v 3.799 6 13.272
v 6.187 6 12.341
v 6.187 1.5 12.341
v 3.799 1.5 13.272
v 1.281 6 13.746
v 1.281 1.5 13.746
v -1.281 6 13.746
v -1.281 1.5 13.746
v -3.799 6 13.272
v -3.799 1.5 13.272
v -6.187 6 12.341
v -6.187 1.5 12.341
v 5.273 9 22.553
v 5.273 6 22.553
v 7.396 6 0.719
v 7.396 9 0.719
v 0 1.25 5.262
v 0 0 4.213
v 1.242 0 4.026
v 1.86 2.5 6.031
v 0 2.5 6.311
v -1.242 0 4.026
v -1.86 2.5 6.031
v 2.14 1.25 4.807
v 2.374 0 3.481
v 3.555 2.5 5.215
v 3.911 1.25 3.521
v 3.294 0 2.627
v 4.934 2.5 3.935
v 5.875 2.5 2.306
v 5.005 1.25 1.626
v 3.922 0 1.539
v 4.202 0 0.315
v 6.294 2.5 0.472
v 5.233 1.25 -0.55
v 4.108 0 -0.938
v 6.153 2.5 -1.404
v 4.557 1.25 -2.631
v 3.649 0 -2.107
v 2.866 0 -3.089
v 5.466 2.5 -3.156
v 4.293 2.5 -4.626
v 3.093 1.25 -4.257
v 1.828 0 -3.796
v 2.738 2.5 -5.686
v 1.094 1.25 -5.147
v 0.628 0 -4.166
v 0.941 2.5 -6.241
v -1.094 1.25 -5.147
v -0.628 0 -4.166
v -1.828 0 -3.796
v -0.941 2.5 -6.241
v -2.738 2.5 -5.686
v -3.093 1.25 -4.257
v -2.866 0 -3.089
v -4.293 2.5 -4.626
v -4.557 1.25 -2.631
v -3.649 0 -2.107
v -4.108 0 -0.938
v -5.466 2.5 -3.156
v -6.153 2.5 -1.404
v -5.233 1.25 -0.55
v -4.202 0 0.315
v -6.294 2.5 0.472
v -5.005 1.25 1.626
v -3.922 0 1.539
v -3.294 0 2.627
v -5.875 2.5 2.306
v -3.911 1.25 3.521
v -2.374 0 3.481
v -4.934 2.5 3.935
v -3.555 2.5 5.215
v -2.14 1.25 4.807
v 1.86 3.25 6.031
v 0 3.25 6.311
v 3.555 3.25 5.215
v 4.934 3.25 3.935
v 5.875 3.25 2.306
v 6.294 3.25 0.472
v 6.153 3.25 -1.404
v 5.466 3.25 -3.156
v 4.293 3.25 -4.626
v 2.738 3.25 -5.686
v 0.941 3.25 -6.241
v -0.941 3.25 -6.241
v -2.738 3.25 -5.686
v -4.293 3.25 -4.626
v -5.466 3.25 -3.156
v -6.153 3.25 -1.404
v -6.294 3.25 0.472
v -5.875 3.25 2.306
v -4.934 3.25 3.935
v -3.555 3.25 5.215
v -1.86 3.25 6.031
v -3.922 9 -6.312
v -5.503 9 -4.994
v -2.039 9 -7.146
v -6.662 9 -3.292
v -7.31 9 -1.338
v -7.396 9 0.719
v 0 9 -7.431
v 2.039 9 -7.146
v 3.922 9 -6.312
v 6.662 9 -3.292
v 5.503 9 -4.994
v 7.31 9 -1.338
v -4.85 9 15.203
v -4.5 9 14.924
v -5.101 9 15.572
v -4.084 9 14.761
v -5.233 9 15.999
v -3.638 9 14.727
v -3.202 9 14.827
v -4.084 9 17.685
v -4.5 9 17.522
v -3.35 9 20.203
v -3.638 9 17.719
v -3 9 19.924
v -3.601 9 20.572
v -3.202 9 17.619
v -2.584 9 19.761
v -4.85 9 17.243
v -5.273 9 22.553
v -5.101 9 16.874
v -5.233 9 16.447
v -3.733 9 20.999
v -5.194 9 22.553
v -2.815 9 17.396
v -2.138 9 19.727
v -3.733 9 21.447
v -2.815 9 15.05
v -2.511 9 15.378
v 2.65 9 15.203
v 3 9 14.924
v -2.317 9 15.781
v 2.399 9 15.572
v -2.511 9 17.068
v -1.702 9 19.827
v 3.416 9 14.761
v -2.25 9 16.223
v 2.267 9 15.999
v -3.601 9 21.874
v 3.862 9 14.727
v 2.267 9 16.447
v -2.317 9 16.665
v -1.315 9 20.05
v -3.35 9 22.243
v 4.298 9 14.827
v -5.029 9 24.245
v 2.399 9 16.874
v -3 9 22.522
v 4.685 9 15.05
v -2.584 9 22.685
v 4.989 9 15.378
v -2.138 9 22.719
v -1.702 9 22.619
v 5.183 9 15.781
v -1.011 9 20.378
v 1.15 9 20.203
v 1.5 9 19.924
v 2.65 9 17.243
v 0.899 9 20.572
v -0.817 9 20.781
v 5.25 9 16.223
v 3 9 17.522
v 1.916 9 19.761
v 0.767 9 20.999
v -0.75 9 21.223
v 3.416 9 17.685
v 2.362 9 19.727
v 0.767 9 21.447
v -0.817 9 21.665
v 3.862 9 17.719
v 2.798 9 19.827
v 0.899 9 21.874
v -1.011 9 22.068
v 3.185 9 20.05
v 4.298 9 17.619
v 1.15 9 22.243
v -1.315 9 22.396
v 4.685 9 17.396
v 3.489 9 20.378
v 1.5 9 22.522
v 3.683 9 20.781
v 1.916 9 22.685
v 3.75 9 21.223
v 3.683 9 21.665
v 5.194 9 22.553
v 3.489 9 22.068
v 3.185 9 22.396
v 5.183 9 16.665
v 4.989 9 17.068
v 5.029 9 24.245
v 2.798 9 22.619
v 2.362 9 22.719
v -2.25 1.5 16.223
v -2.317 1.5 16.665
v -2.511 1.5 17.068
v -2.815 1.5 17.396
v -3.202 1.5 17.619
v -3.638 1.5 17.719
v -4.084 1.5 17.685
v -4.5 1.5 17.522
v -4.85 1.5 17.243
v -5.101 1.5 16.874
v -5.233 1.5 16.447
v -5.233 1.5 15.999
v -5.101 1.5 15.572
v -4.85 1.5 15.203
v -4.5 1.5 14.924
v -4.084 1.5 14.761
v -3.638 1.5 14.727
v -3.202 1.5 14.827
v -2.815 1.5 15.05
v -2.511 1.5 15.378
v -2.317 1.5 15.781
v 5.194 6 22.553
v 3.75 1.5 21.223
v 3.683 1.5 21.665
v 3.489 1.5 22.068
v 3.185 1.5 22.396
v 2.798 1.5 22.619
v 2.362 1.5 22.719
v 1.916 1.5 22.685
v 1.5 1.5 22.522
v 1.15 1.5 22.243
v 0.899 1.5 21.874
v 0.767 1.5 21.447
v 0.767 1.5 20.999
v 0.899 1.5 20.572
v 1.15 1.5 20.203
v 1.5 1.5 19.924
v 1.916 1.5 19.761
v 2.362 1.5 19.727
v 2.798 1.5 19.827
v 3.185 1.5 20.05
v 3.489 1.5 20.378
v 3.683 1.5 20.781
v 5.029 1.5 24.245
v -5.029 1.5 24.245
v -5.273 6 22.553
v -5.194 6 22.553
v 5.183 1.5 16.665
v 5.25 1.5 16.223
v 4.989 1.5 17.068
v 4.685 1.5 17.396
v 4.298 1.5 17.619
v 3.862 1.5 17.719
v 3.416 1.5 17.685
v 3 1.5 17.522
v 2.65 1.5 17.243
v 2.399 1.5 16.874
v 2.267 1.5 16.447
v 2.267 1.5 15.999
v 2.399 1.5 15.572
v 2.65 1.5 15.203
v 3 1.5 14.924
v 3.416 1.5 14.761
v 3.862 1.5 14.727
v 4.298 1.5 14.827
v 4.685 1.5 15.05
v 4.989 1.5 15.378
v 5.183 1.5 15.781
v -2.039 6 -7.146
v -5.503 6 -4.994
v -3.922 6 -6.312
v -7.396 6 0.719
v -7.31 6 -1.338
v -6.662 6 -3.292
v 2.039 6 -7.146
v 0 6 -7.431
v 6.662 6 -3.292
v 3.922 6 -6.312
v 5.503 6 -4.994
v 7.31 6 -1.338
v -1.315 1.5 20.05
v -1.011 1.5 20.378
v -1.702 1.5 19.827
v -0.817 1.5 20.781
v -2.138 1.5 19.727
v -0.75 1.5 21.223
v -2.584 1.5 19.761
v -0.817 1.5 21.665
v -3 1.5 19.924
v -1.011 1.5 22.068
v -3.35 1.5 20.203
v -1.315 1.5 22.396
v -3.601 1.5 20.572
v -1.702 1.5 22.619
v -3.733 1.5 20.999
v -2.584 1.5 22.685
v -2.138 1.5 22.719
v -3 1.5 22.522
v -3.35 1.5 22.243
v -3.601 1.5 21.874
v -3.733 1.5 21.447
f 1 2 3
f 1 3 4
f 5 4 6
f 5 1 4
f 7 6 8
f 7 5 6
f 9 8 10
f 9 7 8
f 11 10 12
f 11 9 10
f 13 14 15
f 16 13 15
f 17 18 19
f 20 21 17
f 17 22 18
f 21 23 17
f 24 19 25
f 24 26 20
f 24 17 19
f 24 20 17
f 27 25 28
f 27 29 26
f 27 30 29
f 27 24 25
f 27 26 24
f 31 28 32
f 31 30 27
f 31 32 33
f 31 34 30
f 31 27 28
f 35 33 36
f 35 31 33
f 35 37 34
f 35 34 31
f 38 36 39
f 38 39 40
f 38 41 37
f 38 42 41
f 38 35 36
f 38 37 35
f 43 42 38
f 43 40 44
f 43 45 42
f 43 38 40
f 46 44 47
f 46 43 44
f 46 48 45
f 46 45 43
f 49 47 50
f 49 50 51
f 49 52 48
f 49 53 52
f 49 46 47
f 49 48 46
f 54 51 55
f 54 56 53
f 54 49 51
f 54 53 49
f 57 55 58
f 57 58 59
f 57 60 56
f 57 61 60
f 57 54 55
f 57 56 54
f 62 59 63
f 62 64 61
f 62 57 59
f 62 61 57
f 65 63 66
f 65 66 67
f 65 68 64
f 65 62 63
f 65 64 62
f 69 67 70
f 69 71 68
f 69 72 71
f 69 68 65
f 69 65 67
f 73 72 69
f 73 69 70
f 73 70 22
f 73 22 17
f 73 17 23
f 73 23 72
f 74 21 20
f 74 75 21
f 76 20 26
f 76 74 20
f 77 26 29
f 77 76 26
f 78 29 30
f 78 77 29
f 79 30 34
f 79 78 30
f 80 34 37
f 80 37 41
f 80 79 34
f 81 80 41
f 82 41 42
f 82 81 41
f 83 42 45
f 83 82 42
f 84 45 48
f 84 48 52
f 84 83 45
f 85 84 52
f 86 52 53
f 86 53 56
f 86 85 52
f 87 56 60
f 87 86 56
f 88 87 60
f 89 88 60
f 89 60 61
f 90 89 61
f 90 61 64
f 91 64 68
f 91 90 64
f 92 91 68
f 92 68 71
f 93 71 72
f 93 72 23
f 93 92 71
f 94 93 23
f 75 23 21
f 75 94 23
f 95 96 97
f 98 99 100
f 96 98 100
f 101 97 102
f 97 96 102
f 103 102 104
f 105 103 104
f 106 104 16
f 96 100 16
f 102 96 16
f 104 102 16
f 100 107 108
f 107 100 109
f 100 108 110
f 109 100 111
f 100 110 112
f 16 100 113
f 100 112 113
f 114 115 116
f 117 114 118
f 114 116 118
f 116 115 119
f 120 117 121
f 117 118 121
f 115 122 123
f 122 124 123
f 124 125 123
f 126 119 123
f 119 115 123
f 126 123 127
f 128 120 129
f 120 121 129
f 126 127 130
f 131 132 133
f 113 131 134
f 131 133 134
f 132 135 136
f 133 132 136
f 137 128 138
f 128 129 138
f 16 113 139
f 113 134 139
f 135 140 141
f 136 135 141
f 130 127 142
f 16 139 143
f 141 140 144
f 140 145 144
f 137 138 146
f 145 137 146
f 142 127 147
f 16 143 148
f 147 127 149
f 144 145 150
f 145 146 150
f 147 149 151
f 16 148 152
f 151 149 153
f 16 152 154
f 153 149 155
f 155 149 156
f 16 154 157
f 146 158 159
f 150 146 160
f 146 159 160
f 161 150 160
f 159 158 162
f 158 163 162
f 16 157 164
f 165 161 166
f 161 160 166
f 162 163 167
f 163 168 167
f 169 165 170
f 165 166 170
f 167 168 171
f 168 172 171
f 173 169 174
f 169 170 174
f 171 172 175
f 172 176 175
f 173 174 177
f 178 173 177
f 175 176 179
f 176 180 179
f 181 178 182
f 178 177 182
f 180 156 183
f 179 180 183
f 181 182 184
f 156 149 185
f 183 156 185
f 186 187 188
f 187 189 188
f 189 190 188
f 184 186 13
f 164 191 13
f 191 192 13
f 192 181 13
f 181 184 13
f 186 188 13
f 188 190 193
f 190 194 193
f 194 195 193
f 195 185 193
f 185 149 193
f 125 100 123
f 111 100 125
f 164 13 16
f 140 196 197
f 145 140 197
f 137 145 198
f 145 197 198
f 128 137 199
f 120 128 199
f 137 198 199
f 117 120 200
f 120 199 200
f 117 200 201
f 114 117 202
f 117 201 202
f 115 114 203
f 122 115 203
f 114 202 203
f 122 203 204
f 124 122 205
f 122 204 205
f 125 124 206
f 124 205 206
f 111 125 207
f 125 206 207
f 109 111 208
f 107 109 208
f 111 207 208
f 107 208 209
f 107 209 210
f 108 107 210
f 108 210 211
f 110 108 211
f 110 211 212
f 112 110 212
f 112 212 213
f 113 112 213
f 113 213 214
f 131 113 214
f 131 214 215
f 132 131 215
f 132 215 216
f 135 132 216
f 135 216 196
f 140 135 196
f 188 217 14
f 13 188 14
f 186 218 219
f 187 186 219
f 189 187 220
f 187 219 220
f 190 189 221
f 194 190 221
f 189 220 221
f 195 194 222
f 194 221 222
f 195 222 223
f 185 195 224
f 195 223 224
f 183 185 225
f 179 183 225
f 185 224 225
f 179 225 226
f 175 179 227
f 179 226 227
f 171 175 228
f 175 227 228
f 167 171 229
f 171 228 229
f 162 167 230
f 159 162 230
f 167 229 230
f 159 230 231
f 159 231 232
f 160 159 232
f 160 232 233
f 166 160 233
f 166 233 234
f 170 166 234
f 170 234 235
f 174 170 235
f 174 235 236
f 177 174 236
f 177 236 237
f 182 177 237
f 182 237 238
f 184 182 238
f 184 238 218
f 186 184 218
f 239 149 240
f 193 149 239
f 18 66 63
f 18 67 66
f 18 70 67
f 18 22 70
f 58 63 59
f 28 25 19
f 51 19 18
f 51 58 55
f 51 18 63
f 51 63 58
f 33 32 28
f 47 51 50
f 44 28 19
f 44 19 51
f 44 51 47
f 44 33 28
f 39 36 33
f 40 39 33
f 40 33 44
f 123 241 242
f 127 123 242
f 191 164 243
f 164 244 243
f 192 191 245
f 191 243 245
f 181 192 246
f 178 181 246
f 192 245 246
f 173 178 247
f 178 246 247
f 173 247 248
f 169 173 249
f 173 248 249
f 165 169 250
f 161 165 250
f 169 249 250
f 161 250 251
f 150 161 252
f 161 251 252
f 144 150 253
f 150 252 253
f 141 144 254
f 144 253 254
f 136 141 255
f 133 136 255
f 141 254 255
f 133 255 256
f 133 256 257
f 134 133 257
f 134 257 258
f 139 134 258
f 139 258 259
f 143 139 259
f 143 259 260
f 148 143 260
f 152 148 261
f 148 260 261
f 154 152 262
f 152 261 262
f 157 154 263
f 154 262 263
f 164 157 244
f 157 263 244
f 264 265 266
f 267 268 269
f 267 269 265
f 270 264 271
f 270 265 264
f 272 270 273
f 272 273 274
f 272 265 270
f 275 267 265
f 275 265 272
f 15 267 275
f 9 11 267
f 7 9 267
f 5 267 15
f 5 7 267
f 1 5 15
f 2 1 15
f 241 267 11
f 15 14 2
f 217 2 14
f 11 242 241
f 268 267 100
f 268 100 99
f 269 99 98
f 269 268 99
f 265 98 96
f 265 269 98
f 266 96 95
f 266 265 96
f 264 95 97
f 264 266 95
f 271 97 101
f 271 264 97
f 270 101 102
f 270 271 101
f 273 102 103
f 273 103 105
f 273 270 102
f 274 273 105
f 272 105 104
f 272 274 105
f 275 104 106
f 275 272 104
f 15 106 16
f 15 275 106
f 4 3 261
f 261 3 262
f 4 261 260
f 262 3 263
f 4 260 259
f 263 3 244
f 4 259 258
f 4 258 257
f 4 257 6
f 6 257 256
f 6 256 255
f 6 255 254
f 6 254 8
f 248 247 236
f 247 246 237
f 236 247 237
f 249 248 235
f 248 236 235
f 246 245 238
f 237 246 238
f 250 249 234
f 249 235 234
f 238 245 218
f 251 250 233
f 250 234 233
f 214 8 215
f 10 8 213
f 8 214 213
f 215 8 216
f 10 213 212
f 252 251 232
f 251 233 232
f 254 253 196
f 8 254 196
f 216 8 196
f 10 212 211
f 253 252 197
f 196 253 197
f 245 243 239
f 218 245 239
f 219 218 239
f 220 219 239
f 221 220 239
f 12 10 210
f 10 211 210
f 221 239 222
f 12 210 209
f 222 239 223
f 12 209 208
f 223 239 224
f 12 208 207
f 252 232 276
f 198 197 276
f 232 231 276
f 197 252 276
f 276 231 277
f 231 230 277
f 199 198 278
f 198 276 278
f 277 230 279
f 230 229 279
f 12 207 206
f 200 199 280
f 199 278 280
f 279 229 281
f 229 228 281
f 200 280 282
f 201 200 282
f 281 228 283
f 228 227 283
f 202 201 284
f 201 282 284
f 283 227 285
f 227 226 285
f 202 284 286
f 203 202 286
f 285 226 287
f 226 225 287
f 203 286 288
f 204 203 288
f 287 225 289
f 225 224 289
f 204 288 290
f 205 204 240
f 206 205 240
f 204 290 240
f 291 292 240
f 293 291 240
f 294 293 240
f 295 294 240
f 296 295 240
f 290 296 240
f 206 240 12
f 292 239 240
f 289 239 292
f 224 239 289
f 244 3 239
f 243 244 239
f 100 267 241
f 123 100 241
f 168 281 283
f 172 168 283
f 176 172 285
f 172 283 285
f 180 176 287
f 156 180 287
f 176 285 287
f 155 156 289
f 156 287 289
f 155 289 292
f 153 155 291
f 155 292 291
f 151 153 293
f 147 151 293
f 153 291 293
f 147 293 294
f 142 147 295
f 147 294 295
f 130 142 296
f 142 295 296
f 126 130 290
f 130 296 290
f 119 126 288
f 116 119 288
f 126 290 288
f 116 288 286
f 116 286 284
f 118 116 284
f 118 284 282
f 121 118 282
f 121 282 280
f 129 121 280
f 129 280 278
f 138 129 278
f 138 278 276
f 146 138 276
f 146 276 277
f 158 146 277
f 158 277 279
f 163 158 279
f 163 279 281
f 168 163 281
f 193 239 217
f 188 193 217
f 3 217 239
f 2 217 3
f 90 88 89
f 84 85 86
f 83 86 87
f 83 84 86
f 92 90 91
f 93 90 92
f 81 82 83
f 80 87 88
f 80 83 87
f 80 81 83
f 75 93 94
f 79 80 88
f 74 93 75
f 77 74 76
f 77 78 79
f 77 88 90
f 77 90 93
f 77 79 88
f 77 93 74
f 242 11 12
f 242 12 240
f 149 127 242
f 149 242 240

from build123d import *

# Parameters (mm, degrees)
SKETCH011_R  = 1.5
PAD004_DEPTH = 10
PAD005_DEPTH = 7.5
PAD003_DEPTH = 3


with BuildPart() as armmountcutout:
    # Sketch011 → Pad004 (new body, symmetric)
    with BuildSketch(Plane.XZ):
        with Locations((-2.25, 21.222956)):
            Circle(SKETCH011_R)
        with Locations((-3.75, 16.222956)):
            Circle(SKETCH011_R)
        with Locations((2.25, 21.222956)):
            Circle(SKETCH011_R)
        with Locations((3.75, 16.222956)):
            Circle(SKETCH011_R)
    extrude(amount=PAD004_DEPTH, both=True)


with BuildPart() as armmountpad:
    # Sketch012 → Pad005 (new body)
    with BuildSketch(Plane.XZ.offset(-9)):
        with BuildLine():
            ThreePointArc((6.186762, 12.341251), (0, 13.805162), (-6.186762, 12.341251))
            Line((-6.186762, 12.341251), (-5.02905, 24.245485))
            Line((-5.02905, 24.245485), (5.02905, 24.245485))
            Line((5.02905, 24.245485), (6.186762, 12.341251))
        make_face()
    extrude(amount=PAD005_DEPTH)


with BuildPart() as armmountbase:
    # Sketch010 → Pad003 (new body)
    with BuildSketch(Plane.XZ.offset(-6)):
        with BuildLine():
            ThreePointArc((-7.396368, 0.719373), (0, -7.431269), (7.396368, 0.719373))
            Line((5.272787, 22.55337), (7.396368, 0.719373))
            Line((-5.272787, 22.55337), (5.272787, 22.55337))
            Line((-7.396368, 0.719373), (-5.272787, 22.55337))
        make_face()
    extrude(amount=-PAD003_DEPTH)


with BuildPart() as cut001:
    # Sketch008 → Revolution002 (revolve)
    with BuildSketch(Plane.YZ):
        Polygon((0, 4.213446), (2.5, 6.311195), (3.25, 6.311195), (3.25, 0), (0, 0), align=None)
    revolve(axis=Axis((0, 0, 0), (0, 1, 0)))

    # Fusion: union ArmMountPad, ArmMountBase
    add(armmountpad.part)
    add(armmountbase.part)

    # Cut001: cut ArmMountCutout
    add(armmountcutout.part, mode=Mode.SUBTRACT)


solid = cut001.part
